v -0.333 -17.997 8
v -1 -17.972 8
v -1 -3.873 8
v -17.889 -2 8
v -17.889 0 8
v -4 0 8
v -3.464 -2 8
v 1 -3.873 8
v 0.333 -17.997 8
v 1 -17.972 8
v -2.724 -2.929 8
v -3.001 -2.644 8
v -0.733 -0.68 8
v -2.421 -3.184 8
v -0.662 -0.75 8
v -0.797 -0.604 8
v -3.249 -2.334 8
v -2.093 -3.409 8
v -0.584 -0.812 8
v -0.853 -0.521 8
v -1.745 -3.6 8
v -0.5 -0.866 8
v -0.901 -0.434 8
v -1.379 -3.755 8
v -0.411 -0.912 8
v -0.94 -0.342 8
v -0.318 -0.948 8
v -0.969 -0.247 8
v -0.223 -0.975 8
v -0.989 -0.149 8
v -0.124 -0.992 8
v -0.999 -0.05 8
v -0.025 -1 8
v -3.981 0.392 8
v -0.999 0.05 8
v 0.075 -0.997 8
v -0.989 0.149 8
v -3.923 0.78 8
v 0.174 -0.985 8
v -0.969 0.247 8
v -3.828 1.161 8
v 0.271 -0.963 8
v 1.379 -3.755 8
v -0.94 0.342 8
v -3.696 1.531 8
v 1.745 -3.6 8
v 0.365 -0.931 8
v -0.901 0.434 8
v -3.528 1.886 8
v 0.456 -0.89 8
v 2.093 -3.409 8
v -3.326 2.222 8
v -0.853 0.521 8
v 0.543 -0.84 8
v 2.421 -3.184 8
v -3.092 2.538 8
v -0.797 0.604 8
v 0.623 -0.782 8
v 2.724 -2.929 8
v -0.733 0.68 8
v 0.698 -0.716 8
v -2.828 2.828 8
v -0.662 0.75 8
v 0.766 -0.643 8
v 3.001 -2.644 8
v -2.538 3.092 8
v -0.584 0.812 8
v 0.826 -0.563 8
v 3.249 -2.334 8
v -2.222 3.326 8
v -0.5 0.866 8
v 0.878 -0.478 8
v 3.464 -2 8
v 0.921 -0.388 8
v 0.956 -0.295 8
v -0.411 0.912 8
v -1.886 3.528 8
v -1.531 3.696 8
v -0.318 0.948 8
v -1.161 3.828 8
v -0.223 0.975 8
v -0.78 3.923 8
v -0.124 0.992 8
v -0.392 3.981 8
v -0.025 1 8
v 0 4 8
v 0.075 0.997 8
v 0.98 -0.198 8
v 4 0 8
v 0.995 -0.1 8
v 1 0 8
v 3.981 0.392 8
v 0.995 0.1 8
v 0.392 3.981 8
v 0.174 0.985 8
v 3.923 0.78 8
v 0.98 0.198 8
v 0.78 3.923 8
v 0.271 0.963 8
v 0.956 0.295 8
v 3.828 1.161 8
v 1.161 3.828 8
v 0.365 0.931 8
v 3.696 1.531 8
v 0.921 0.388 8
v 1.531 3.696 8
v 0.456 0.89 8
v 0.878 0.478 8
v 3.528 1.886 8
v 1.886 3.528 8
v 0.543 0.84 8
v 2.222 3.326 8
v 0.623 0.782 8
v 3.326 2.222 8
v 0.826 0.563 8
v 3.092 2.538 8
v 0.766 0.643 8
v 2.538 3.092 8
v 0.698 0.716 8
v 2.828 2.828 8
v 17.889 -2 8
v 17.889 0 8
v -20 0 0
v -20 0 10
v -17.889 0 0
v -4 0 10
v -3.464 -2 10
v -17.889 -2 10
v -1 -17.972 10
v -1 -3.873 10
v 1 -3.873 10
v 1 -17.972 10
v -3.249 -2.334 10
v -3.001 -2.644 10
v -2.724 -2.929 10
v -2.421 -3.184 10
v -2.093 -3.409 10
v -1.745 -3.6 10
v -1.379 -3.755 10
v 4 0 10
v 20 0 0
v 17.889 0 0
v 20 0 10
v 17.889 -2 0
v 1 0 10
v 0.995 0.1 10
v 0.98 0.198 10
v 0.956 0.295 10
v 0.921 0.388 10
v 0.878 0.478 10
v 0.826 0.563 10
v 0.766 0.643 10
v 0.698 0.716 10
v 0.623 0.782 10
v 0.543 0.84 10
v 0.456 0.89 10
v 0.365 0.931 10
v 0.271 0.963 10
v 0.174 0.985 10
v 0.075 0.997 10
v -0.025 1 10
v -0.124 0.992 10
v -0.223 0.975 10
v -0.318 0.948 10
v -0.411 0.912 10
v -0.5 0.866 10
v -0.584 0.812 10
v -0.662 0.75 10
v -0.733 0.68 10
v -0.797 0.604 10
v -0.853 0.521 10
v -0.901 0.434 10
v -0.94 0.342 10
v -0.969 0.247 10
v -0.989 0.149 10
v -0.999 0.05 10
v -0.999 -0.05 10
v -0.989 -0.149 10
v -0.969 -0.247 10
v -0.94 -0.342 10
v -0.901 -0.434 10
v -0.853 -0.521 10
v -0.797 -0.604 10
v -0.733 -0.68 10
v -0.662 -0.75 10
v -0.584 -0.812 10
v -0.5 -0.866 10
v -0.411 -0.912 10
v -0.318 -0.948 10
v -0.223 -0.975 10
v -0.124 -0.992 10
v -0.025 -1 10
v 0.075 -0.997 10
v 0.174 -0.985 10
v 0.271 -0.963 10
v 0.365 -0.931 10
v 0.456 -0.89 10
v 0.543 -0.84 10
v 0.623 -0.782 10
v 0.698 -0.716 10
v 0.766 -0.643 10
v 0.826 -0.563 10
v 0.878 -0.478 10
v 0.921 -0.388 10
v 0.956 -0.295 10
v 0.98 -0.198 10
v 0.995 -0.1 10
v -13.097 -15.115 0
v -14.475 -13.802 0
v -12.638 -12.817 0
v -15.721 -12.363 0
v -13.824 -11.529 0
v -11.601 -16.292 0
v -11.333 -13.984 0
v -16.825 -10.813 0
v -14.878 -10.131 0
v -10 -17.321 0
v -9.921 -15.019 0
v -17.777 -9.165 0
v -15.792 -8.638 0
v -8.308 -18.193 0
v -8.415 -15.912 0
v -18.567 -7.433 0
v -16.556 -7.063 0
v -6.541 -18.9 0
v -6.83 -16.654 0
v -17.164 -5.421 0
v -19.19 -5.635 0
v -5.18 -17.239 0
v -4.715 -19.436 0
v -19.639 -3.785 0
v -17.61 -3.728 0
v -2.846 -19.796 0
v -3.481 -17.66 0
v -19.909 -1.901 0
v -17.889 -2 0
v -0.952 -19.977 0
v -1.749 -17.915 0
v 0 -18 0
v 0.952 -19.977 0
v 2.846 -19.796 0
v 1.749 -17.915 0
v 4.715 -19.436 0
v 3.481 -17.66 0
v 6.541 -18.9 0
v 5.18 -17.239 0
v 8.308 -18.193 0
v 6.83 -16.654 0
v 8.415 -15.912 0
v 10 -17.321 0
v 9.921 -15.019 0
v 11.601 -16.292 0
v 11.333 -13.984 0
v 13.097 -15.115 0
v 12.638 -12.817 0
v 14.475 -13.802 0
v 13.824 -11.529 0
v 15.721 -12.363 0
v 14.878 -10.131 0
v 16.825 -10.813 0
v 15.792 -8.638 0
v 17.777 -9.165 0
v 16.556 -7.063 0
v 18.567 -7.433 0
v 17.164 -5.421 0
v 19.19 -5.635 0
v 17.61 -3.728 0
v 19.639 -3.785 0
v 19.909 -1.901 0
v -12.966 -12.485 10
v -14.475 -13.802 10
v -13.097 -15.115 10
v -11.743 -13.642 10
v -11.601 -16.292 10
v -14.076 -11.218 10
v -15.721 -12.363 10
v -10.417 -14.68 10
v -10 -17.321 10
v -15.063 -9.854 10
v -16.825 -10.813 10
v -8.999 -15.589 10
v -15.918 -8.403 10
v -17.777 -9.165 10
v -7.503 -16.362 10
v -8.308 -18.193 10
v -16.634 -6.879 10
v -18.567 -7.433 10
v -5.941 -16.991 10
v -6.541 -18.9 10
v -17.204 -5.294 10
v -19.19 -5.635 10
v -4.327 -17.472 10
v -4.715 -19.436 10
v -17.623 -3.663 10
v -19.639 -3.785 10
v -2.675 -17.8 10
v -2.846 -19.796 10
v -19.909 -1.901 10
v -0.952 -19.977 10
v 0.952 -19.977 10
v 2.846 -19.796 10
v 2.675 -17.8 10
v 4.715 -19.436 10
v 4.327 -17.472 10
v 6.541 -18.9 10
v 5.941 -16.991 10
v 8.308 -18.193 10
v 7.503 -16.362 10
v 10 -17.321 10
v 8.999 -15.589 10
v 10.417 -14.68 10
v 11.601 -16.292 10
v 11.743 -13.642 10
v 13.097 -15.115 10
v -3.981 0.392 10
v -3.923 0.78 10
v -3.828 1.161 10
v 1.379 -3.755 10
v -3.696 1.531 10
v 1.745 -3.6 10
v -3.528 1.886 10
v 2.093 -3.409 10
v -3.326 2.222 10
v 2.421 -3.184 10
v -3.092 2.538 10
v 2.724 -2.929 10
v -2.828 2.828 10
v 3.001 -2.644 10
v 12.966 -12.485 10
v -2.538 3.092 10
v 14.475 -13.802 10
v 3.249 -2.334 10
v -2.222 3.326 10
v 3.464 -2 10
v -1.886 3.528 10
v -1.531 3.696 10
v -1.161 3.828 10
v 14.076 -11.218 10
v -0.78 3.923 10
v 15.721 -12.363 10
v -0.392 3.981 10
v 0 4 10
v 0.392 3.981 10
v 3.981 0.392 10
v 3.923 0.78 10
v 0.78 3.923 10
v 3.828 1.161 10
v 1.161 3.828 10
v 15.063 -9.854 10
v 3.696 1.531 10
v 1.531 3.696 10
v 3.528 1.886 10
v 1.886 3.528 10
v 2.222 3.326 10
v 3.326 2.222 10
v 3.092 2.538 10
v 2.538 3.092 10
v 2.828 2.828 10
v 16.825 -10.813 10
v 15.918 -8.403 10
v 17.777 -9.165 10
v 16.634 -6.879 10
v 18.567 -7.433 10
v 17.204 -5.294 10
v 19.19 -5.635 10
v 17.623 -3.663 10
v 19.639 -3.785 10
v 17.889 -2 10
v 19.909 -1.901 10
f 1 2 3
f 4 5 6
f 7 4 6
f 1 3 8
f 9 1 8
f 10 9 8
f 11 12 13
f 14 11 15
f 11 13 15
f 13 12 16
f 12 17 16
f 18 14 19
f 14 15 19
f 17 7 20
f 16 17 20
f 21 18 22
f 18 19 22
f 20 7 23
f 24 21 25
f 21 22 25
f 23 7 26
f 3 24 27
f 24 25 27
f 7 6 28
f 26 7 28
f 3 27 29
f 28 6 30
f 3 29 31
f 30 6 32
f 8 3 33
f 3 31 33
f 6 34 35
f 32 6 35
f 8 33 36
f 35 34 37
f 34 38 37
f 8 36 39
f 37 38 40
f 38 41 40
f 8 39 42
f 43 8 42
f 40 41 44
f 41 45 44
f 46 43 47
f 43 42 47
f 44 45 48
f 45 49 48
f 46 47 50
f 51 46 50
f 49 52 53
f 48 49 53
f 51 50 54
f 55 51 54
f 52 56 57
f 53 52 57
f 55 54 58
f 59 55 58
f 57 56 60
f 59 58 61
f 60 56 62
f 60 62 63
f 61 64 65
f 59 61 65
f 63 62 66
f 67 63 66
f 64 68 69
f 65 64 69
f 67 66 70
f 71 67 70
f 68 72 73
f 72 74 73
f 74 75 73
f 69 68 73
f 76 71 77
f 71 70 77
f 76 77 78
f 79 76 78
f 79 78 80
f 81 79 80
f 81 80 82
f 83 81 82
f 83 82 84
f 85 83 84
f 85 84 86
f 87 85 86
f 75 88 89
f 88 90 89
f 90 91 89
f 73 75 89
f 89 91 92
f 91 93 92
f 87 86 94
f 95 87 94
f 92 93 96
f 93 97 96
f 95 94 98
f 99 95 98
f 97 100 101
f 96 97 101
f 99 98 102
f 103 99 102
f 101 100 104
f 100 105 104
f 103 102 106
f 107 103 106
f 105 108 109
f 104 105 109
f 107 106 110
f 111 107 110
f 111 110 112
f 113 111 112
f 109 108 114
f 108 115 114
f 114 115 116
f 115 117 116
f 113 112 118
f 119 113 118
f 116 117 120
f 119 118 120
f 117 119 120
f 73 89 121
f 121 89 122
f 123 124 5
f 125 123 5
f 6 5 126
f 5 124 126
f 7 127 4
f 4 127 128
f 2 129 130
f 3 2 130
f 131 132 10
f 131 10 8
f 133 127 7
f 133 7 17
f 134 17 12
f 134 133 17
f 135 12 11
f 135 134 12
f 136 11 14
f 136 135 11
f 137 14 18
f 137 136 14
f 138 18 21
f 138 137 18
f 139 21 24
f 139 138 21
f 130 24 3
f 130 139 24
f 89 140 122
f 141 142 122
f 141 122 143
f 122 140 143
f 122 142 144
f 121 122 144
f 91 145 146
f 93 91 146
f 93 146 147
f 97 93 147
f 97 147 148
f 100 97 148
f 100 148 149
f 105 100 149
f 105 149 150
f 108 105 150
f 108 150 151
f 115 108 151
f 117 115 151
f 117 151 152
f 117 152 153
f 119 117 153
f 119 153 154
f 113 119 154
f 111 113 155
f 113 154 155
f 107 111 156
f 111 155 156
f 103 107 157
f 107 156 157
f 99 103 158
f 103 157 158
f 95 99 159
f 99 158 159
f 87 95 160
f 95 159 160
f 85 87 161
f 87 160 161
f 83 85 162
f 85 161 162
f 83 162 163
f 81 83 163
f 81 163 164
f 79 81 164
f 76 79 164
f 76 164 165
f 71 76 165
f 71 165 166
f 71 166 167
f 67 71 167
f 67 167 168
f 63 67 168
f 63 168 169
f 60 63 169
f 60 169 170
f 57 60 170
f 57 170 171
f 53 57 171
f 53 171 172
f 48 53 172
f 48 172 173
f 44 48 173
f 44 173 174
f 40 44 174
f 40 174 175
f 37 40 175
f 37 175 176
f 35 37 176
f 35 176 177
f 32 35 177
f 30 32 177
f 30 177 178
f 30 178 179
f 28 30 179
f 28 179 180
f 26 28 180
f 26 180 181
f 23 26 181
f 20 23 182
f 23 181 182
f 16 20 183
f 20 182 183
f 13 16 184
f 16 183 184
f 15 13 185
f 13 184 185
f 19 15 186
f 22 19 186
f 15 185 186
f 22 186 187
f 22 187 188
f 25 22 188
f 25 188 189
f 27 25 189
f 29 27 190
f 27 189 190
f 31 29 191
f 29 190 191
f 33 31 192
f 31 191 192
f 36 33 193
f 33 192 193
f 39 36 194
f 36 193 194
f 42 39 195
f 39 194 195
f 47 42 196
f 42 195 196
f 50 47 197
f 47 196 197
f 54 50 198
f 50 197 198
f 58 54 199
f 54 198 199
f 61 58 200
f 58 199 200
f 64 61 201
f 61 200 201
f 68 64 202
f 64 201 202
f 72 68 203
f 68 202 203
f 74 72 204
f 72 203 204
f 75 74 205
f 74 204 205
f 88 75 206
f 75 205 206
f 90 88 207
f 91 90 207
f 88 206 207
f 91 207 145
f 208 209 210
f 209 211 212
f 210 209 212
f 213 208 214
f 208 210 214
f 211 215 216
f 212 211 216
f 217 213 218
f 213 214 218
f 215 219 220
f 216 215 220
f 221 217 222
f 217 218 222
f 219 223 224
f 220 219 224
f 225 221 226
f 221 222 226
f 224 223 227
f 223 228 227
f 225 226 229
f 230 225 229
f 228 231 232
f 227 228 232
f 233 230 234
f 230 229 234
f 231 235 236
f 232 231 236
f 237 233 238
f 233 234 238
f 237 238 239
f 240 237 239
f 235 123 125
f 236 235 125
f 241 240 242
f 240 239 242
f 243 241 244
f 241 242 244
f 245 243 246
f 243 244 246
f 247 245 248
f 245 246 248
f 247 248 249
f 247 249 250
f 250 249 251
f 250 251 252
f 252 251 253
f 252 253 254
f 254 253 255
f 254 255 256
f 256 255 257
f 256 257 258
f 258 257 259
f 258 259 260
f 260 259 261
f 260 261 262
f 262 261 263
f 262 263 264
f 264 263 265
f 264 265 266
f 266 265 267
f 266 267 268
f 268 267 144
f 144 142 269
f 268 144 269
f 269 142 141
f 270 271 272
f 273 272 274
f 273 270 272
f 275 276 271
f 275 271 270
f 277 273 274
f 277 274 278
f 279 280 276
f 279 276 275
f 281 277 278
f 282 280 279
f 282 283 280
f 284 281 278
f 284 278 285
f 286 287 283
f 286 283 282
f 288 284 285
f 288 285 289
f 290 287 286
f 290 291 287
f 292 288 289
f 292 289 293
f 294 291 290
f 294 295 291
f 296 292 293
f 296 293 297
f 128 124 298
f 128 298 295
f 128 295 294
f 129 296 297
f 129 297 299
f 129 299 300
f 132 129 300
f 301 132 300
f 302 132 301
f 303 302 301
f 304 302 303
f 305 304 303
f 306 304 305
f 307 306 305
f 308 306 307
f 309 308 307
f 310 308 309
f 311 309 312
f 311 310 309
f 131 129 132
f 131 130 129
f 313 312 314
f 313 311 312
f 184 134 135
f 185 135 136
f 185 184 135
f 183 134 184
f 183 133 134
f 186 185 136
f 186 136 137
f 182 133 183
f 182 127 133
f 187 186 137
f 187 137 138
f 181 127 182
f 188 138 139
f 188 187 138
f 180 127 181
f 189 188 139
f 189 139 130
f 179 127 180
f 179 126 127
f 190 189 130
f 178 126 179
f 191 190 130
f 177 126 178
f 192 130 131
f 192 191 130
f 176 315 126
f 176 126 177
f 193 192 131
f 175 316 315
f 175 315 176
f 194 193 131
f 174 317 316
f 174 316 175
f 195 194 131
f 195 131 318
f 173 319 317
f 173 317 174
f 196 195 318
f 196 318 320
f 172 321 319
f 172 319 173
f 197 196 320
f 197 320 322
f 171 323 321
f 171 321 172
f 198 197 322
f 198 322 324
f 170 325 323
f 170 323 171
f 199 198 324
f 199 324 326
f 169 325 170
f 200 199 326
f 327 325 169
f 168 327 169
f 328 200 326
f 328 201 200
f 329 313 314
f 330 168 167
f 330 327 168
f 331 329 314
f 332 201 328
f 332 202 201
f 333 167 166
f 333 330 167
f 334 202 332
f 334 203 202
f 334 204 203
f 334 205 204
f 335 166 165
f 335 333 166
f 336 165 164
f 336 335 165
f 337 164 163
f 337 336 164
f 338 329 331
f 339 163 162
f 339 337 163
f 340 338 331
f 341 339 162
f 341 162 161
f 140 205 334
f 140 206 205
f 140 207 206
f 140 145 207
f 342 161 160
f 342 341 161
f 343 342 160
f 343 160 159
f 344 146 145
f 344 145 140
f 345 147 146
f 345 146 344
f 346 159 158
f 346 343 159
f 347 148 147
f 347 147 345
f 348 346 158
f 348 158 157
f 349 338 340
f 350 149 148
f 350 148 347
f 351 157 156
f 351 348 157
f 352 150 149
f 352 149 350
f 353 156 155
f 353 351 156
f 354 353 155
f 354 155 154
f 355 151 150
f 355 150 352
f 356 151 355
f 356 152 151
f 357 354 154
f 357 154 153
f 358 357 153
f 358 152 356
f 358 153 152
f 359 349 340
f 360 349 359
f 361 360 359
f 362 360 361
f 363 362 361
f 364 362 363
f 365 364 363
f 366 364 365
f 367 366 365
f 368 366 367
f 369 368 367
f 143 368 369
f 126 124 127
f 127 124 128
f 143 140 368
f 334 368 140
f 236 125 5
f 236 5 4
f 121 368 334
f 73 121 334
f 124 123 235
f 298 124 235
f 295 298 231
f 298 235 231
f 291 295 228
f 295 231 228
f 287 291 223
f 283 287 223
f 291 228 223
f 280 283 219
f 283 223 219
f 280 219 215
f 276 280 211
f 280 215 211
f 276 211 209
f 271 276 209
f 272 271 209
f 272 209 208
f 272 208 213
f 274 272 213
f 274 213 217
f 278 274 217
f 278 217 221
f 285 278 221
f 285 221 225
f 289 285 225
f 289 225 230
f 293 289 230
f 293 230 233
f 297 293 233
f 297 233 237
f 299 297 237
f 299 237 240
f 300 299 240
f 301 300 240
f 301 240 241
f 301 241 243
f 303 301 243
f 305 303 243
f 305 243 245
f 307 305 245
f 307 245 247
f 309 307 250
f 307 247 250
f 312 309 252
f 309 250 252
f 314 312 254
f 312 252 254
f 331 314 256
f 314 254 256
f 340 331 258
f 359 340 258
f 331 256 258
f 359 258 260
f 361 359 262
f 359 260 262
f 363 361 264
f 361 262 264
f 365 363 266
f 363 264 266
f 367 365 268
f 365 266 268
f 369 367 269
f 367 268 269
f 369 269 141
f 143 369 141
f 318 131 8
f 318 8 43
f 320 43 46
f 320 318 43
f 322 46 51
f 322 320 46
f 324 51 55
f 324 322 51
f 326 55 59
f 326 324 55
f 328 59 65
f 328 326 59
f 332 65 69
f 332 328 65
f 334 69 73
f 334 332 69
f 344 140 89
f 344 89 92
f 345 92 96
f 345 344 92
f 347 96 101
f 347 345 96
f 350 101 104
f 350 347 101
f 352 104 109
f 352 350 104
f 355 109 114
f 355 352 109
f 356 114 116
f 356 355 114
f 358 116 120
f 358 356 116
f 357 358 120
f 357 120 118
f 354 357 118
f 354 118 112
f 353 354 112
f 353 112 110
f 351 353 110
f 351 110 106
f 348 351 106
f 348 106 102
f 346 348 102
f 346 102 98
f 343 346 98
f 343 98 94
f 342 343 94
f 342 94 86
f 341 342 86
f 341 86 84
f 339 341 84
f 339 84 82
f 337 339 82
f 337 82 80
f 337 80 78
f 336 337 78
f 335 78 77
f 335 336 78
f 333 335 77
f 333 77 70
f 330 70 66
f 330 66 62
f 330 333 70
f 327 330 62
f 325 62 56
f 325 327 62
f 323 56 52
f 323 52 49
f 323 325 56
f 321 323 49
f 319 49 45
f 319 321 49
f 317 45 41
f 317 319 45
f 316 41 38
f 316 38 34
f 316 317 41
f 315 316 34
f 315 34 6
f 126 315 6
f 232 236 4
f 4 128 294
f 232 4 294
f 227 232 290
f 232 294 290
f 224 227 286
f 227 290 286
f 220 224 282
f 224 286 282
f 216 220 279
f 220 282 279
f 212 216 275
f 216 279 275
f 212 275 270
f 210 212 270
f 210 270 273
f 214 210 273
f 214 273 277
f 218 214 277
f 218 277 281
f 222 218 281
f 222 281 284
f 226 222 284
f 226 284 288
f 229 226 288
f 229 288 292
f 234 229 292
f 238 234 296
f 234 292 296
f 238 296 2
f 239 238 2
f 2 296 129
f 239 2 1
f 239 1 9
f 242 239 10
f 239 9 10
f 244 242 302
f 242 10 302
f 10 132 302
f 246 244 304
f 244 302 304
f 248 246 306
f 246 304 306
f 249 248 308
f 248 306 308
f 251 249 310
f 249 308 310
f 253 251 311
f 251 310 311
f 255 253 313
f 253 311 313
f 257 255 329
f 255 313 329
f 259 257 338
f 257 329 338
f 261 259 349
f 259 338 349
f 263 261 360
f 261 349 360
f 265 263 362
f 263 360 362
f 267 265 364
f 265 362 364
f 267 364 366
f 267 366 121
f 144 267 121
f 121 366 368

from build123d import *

# Parameters (mm, degrees)
F0_R      = 20
F1_DEPTH  = 10
F3_DEPTH  = 25
F4_DEPTH  = 25
F6_DEPTH  = 25
F7_W      = 35.777088
F7_H      = 2
F8_DEPTH  = 8
F9_W      = 2
F9_H      = 17.974984
F10_DEPTH = 2
F11_R     = 4
F12_DEPTH = 2
F13_R     = 1
F14_DEPTH = 25


with BuildPart() as f1:
    # F0 (on Top) → F1 (new body)
    with BuildSketch(Plane.XY):
        Circle(F0_R)
    extrude(amount=F1_DEPTH)

    # F2 (on face) → F3 (cut)
    with BuildSketch(Plane.XY.offset(10)):
        with BuildLine():
            Line((-20, 0), (0, 0))
            Line((0, 0), (20, 0))
            ThreePointArc((20, 0), (0, 20), (-20, 0))
        make_face()
    extrude(amount=-F3_DEPTH, mode=Mode.SUBTRACT)

    # F2 (on face) → F4 (cut)
    with BuildSketch(Plane.XY.offset(10)):
        with BuildLine():
            Line((-20, 0), (0, 0))
            Line((0, 0), (20, 0))
            ThreePointArc((20, 0), (0, 20), (-20, 0))
        make_face()
    extrude(amount=-F4_DEPTH, mode=Mode.SUBTRACT)

    # F5 (on face) → F6 (cut)
    with BuildSketch(Plane.XY.offset(10)):
        with BuildLine():
            ThreePointArc((-17.888544, -2), (0, -18), (17.888544, -2))
            Line((17.888544, -2), (-17.888544, -2))
        make_face()
    extrude(amount=-F6_DEPTH, mode=Mode.SUBTRACT)

    # F7 (on face) → F8 (cut)
    with BuildSketch(Plane(origin=(0, 0, 0), x_dir=(1, 0, 0), z_dir=(0, 0, -1))):
        with Locations((0, 1)):
            Rectangle(F7_W, F7_H)
    extrude(amount=-F8_DEPTH, mode=Mode.SUBTRACT)

    # F9 (on face) → F10 (join)
    with BuildSketch(Plane.XY.offset(10)):
        with Locations((0, -10.987492)):
            Rectangle(F9_W, F9_H)
    extrude(amount=-F10_DEPTH)

    # F11 (on face) → F12 (join)
    with BuildSketch(Plane.XY.offset(10)):
        Circle(F11_R)
    extrude(amount=-F12_DEPTH)

    # F13 (on face) → F14 (cut)
    with BuildSketch(Plane.XY.offset(10)):
        Circle(F13_R)
    extrude(amount=-F14_DEPTH, mode=Mode.SUBTRACT)


solid = f1.part
